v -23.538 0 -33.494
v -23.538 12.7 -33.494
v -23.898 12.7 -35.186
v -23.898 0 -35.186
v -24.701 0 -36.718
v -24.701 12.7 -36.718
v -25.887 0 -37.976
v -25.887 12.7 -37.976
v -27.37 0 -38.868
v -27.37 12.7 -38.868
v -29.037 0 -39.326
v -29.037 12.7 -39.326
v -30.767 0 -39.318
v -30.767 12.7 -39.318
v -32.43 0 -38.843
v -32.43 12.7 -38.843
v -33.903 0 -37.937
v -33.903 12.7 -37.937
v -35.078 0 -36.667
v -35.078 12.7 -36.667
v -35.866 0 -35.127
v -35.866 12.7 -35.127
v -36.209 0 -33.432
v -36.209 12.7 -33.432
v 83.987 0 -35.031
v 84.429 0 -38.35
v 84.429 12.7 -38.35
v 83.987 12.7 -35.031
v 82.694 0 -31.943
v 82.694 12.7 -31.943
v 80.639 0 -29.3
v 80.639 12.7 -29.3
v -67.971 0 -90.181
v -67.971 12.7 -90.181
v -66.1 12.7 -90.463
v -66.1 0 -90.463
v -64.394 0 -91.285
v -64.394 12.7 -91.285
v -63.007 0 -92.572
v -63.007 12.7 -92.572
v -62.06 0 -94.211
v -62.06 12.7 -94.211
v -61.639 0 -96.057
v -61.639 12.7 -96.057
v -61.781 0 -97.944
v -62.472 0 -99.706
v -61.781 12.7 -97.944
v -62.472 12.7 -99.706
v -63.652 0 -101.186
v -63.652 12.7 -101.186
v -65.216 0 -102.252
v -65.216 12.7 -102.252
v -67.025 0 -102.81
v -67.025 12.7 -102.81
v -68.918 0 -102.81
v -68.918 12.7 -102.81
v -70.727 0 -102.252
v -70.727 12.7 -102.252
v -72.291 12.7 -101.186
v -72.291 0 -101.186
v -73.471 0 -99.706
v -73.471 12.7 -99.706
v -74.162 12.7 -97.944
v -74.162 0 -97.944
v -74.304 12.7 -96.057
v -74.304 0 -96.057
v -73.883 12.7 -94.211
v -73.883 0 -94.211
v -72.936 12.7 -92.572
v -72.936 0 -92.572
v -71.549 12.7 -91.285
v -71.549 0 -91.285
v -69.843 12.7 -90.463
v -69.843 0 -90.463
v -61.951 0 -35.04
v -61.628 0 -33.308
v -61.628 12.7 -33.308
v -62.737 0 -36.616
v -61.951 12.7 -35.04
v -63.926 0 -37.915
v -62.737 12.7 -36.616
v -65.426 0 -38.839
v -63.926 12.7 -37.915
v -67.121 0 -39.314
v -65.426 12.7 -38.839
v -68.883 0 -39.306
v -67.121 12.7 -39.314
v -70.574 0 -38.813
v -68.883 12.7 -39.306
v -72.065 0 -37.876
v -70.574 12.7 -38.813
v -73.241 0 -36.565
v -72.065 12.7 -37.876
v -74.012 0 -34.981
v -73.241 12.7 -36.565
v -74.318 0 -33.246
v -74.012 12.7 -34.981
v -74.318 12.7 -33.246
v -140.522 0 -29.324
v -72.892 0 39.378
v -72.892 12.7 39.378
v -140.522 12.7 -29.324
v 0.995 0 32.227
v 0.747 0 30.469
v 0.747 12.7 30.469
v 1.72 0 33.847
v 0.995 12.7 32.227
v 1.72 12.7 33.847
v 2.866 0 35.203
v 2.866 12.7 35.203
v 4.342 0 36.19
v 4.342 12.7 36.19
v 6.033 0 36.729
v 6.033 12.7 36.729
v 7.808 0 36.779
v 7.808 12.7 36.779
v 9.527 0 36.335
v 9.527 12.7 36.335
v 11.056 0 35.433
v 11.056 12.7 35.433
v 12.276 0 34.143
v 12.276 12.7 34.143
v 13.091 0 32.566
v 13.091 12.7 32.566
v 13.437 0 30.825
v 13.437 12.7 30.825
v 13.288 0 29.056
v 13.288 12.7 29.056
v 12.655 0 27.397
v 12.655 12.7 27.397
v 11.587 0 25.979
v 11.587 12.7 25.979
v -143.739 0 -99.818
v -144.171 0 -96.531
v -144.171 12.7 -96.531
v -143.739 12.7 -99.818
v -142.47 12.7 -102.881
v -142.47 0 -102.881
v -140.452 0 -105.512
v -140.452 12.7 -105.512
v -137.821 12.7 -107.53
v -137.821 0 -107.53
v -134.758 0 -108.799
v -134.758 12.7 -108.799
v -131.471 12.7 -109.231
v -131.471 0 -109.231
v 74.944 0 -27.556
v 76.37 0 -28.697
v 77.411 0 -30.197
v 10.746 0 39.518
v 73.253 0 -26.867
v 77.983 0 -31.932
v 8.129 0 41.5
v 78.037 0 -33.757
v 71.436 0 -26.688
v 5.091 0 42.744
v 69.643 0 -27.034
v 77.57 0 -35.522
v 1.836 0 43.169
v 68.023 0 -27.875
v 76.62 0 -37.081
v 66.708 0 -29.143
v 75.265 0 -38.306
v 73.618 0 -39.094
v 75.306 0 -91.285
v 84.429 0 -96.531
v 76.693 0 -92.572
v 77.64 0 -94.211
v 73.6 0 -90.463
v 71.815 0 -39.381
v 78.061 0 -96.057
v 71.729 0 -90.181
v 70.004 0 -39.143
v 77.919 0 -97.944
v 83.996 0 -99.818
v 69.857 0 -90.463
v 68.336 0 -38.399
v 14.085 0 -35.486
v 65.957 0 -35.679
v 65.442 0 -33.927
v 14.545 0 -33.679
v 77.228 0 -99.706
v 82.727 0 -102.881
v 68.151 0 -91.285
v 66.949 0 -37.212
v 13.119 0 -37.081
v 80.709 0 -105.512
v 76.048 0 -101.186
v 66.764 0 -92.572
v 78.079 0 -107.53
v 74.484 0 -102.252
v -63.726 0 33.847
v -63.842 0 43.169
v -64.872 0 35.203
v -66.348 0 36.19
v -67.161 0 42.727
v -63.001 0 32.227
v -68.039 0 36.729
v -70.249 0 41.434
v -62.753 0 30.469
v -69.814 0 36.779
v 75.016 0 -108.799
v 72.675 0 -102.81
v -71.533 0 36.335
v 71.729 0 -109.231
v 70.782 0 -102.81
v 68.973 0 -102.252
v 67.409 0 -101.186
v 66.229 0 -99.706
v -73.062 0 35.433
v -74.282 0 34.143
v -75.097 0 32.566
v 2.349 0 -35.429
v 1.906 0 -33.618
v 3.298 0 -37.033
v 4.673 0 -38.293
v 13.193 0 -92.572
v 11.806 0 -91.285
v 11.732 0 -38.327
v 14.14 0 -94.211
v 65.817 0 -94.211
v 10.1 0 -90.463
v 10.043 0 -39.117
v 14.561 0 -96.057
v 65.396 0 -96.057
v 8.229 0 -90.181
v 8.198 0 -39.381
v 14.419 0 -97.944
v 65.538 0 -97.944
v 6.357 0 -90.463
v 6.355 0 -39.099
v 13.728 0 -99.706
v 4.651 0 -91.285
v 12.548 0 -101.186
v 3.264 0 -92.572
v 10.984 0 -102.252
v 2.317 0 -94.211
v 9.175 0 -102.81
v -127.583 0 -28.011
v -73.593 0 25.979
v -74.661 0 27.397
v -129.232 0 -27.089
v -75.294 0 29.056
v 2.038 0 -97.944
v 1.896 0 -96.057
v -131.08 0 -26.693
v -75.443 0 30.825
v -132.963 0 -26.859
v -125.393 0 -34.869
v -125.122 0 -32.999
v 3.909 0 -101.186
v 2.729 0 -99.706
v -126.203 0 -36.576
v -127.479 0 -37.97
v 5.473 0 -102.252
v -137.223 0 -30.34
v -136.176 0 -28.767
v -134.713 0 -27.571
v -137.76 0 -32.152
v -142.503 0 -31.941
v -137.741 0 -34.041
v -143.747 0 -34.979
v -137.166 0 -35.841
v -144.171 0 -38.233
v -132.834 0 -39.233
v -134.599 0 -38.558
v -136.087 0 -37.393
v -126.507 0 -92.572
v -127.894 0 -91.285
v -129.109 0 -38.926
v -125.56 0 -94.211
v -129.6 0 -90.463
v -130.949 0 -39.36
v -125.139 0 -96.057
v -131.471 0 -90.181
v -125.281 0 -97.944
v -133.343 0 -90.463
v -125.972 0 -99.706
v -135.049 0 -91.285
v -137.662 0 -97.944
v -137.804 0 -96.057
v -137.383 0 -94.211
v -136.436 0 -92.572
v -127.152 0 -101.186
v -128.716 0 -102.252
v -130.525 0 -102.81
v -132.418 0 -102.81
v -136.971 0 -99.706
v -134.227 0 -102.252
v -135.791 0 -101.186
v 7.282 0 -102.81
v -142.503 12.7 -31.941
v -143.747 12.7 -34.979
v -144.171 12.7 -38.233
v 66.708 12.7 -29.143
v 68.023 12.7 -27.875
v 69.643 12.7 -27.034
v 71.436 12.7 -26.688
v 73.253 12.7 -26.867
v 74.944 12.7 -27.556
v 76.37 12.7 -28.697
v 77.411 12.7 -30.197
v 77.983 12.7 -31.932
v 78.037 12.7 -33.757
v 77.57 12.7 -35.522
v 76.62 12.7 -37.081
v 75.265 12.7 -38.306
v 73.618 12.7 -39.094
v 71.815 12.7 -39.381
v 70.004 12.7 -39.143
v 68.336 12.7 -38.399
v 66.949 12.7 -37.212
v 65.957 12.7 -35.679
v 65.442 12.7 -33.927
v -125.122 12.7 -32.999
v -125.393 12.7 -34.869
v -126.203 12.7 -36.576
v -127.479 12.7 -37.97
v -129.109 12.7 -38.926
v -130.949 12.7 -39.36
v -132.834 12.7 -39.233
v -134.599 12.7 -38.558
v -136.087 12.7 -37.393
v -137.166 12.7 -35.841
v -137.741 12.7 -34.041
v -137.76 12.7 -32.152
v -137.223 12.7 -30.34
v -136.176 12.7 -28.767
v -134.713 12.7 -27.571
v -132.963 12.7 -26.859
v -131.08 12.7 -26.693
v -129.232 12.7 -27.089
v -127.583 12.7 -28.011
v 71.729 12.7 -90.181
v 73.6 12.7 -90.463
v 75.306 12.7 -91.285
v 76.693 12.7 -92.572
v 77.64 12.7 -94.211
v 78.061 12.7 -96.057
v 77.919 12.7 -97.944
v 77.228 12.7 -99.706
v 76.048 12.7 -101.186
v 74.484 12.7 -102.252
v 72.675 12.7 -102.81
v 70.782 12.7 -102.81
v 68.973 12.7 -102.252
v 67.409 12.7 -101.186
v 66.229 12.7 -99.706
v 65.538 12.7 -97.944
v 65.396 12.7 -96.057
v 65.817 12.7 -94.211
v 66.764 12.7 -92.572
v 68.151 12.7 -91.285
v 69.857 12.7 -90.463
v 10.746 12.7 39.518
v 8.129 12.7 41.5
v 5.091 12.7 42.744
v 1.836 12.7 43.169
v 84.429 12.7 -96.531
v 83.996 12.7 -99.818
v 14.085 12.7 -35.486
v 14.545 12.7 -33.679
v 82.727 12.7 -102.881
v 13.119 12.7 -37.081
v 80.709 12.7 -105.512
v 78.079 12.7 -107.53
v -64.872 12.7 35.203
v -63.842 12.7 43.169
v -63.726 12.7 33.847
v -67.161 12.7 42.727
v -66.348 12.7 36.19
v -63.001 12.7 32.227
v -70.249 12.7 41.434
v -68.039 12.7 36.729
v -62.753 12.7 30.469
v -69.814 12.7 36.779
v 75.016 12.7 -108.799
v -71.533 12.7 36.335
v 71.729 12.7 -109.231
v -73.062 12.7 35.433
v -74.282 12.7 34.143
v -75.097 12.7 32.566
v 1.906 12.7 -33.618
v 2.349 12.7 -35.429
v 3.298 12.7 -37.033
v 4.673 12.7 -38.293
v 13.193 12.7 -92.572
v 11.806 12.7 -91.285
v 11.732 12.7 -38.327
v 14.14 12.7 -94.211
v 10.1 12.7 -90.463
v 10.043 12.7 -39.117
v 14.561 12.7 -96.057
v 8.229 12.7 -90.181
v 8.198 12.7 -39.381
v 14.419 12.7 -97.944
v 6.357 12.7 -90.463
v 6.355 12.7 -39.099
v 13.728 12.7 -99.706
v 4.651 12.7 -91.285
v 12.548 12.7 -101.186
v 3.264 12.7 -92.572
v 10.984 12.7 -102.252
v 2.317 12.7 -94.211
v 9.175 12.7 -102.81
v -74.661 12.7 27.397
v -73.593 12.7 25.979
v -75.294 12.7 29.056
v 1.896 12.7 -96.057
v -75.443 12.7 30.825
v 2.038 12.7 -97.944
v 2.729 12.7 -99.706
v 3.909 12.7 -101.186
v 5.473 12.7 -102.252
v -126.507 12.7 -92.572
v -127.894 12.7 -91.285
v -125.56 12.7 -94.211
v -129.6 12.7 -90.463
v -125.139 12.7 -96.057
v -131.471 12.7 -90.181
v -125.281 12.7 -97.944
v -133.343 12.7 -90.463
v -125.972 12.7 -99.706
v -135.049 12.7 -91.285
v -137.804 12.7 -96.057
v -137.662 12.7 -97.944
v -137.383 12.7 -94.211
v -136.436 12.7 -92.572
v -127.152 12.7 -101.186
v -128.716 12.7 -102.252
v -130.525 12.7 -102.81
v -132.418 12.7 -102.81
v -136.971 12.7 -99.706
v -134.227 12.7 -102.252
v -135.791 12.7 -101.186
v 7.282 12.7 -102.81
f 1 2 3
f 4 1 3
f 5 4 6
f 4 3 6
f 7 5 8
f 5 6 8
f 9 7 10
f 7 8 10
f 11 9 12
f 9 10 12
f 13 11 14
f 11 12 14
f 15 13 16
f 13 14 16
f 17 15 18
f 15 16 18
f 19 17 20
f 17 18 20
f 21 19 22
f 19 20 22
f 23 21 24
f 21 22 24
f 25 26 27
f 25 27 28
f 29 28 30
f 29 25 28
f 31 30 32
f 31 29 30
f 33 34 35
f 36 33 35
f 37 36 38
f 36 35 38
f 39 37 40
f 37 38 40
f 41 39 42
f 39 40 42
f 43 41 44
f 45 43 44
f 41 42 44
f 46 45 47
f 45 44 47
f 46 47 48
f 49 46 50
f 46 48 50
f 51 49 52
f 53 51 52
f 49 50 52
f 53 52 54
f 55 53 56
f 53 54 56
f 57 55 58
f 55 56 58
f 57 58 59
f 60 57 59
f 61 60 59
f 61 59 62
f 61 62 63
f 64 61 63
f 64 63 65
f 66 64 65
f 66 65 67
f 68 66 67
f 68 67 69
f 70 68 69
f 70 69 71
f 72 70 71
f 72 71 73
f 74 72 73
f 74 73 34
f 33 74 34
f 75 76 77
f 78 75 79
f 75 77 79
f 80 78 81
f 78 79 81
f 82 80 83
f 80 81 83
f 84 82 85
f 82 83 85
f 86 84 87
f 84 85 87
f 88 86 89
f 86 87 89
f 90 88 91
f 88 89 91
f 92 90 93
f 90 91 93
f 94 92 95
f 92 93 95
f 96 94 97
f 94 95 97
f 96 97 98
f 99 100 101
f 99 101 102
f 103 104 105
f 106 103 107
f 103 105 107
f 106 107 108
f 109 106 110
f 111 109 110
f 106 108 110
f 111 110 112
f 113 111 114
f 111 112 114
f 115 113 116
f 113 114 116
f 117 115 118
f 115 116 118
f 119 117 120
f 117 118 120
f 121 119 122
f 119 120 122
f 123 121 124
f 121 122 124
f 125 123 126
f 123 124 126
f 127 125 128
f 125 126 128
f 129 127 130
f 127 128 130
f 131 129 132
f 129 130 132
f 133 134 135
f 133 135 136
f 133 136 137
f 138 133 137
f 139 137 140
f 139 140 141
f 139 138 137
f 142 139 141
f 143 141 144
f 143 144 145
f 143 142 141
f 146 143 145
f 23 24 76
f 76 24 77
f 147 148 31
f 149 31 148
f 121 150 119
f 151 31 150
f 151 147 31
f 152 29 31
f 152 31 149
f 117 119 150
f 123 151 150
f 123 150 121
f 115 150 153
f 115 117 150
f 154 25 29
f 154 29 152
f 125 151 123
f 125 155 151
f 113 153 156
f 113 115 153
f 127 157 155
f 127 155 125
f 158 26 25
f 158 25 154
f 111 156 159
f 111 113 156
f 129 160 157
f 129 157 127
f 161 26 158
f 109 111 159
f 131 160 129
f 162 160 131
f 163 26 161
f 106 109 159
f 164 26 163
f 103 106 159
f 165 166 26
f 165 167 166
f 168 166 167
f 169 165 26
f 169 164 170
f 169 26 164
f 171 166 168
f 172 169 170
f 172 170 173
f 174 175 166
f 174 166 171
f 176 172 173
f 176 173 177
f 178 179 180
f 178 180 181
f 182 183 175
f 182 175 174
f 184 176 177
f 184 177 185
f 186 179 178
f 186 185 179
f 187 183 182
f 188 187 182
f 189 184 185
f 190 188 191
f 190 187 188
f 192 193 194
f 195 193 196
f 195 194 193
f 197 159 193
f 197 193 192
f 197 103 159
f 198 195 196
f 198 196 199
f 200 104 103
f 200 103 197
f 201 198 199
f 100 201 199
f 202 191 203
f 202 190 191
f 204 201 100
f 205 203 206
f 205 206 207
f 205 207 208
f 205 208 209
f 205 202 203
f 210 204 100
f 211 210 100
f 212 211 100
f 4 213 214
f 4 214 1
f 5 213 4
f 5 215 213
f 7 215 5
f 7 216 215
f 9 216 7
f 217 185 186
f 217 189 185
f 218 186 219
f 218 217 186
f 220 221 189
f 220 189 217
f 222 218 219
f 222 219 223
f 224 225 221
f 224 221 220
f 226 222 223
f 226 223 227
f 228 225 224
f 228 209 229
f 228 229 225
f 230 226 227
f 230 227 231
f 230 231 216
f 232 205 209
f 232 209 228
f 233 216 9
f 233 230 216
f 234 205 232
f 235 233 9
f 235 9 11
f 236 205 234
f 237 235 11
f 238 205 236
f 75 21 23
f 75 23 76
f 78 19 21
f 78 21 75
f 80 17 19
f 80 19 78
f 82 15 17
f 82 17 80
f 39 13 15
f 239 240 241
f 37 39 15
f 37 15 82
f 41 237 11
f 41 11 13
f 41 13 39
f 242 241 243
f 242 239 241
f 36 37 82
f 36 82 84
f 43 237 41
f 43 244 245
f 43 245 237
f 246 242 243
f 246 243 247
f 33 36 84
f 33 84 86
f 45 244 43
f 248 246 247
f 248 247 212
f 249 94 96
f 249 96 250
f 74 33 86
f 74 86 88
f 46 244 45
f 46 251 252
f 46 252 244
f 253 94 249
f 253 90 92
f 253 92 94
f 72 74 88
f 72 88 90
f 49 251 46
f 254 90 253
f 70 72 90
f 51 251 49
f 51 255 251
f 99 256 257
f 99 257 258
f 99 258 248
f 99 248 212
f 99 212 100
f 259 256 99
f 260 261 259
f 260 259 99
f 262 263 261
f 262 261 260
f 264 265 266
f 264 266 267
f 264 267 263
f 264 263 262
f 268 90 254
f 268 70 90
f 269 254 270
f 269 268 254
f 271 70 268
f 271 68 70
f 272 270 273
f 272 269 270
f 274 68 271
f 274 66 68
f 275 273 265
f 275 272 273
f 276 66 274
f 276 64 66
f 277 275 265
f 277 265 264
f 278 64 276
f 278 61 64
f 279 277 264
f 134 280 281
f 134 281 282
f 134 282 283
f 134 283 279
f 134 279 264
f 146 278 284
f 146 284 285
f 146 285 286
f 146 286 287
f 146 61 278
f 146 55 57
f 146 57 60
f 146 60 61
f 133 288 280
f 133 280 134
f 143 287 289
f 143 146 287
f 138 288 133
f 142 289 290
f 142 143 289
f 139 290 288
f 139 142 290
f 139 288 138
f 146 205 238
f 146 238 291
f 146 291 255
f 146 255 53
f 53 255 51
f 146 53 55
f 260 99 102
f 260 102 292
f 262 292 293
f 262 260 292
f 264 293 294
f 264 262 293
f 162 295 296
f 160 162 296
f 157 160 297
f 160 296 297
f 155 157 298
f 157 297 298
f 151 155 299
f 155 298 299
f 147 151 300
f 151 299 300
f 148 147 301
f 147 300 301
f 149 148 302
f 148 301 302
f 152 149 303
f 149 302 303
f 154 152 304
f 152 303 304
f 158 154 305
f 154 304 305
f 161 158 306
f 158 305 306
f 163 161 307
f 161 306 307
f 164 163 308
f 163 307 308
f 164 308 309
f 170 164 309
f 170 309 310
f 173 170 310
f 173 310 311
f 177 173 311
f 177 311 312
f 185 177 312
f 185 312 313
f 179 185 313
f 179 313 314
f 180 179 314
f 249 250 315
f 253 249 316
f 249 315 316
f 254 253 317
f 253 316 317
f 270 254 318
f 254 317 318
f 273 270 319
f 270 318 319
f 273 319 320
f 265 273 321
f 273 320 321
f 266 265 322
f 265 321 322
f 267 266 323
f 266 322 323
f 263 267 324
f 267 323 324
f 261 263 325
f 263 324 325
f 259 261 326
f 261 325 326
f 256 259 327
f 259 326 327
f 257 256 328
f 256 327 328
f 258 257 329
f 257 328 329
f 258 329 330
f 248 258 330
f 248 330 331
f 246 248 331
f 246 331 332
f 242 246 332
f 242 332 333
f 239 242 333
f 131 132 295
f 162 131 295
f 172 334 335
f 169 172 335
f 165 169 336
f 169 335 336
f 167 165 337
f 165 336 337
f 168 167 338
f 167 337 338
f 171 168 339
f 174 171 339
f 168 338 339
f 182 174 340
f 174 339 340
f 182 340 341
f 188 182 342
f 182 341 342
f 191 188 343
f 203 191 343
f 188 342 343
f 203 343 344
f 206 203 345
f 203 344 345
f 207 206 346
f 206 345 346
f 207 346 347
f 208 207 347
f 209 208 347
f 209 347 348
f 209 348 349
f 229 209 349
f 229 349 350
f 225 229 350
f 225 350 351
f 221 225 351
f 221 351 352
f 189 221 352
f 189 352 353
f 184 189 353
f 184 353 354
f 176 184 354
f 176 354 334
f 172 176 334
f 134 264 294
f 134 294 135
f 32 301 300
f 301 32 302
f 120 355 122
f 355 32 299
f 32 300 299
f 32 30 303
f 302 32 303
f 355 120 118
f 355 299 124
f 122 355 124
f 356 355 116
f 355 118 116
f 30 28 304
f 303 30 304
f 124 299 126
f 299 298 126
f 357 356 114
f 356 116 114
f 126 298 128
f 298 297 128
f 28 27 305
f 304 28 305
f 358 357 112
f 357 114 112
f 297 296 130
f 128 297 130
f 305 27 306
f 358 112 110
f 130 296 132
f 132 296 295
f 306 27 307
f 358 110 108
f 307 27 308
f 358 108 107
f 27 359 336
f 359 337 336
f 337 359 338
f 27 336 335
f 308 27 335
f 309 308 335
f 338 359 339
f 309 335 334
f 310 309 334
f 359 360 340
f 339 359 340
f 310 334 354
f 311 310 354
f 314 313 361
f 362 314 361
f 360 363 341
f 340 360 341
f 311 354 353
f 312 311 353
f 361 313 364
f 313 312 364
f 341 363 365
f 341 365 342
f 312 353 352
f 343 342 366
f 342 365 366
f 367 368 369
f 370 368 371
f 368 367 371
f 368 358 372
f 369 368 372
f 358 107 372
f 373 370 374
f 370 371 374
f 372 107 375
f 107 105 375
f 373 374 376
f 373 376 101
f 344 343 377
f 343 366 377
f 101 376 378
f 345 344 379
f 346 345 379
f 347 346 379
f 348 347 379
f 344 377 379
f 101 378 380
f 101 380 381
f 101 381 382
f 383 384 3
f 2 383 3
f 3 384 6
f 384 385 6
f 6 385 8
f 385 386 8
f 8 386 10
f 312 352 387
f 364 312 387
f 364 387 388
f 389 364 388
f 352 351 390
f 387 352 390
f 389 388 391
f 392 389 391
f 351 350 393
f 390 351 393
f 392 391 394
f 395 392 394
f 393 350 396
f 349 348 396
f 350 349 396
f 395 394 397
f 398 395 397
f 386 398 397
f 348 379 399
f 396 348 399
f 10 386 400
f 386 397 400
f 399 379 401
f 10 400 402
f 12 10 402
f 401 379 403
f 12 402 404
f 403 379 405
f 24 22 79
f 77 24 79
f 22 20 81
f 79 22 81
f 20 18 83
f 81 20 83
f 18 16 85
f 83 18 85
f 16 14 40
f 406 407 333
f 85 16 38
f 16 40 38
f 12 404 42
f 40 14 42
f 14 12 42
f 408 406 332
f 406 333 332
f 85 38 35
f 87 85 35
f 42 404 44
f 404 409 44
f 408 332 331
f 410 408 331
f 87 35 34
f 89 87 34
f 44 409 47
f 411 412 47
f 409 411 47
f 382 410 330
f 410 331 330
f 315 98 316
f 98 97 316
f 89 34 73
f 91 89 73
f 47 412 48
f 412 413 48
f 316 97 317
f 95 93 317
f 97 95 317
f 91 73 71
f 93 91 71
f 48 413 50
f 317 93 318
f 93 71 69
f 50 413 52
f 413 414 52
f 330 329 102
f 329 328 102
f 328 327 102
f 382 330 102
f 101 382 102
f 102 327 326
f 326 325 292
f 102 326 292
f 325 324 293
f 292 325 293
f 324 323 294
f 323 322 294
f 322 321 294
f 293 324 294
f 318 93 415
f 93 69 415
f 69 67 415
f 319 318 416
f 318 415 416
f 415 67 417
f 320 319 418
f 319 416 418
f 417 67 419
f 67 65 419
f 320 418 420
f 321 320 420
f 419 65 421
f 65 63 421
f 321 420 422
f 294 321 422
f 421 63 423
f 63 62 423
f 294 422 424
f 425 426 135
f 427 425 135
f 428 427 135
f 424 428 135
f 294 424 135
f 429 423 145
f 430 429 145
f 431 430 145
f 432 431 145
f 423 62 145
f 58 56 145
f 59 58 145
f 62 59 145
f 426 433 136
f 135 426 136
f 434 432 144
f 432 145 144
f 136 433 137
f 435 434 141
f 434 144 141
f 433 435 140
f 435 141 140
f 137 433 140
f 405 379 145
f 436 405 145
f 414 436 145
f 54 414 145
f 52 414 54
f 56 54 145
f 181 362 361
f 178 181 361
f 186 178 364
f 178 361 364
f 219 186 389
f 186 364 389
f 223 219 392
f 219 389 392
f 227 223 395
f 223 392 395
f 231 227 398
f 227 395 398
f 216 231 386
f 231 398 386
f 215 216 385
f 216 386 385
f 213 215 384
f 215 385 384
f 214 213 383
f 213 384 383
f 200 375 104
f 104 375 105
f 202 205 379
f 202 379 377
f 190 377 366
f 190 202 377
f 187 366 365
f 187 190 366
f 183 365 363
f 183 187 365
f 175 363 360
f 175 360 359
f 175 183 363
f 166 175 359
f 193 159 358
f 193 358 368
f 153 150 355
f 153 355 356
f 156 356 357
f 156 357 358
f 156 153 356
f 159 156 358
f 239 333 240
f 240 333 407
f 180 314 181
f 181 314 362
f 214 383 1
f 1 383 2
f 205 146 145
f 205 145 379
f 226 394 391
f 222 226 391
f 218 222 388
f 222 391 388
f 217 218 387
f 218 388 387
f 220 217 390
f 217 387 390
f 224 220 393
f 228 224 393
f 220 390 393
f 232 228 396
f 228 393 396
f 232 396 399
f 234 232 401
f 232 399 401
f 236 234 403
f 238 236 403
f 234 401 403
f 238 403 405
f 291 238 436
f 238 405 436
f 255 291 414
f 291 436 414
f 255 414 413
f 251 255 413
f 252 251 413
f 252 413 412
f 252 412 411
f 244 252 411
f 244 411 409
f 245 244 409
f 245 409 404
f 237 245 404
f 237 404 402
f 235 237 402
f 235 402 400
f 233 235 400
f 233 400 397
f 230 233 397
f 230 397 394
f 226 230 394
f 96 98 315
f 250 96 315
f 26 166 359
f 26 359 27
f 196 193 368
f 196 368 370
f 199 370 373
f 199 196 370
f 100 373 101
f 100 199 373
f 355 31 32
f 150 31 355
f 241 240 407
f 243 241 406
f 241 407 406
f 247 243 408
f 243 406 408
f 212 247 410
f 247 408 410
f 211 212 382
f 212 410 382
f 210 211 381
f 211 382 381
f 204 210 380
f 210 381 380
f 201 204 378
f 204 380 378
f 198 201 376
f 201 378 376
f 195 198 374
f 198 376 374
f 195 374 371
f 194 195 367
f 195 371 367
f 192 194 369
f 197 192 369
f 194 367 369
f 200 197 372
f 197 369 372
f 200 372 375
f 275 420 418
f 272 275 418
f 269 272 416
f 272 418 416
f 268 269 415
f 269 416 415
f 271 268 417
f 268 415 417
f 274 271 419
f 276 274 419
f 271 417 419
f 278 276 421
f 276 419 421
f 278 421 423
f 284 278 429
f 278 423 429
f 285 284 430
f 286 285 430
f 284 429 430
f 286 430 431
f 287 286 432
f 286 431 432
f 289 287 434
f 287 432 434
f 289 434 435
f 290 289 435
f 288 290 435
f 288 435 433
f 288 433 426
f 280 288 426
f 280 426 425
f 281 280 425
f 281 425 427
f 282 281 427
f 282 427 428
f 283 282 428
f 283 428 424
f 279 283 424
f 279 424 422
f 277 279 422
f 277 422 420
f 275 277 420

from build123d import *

# Parameters (mm, degrees)
BOSS_EXTRUDE1_DEPTH = 12.7
SKETCH2_R           = 6.35
CUT_EXTRUDE1_DEPTH  = 182.323455578
CUT_EXTRUDE10_DEPTH = 182.323455578


with BuildPart() as part:
    # Sketch1 → Boss-Extrude1 (new body)
    with BuildSketch(Plane(origin=(0, 0, 0), x_dir=(1, 0, 0), z_dir=(0, 1, 0))):
        with BuildLine():
            Line((-131.471489953, 109.23134636), (71.728510047, 109.23134636))
            ThreePointArc((71.728510047, 109.23134636), (80.708766168, 105.511602481), (84.428510047, 96.53134636))
            Line((84.428510047, 96.53134636), (84.428510047, 38.349564826))
            ThreePointArc((84.428510047, 38.349564826), (83.442873319, 33.444088994), (80.638952072, 29.300033185))
            Line((80.638952072, 29.300033185), (10.746499625, -39.518185281))
            ThreePointArc((10.746499625, -39.518185281), (6.650668081, -42.220654573), (1.836057601, -43.16865364))
            Line((1.836057601, -43.16865364), (-63.841823784, -43.16865364))
            ThreePointArc((-63.841823784, -43.16865364), (-68.748013198, -42.182718068), (-72.892440933, -39.377993078))
            Line((-72.892440933, -39.377993078), (-140.522107103, 29.324094297))
            ThreePointArc((-140.522107103, 29.324094297), (-143.22378415, 33.419539146), (-144.171489953, 38.233433734))
            Line((-144.171489953, 38.233433734), (-144.171489953, 96.53134636))
            ThreePointArc((-144.171489953, 96.53134636), (-140.451746074, 105.511602481), (-131.471489953, 109.23134636))
        make_face()
    extrude(amount=BOSS_EXTRUDE1_DEPTH)

    # Sketch2 → Cut-Extrude1 (cut, through all)
    with BuildSketch(Plane(origin=(0, 12.7, 0), x_dir=(1, 0, 0), z_dir=(0, 1, 0))):
        with Locations(Location((-69.102883091, -30.46865364, 0), (0, 0, 270))):
            Circle(SKETCH2_R)
        with Locations(Location((7.097116909, -30.46865364, 0), (0, 0, 270))):
            Circle(SKETCH2_R)
        with Locations(Location((-67.971489953, 96.53134636, 0), (0, 0, 270))):
            Circle(SKETCH2_R)
        with Locations(Location((8.228510047, 96.53134636, 0), (0, 0, 270))):
            Circle(SKETCH2_R)
        with Locations(Location((-67.971489286, 33.021266411, 0), (0, 0, 270))):
            Circle(SKETCH2_R)
        with Locations(Location((8.228510047, 33.03134636, 0), (0, 0, 270))):
            Circle(SKETCH2_R)
        with Locations(Location((-131.471489953, 96.53134636, 0), (0, 0, 270))):
            Circle(SKETCH2_R)
        with Locations(Location((-131.471489953, 33.03134636, 0), (0, 0, 270))):
            Circle(SKETCH2_R)
        with Locations(Location((71.728510047, 96.53134636, 0), (0, 0, 270))):
            Circle(SKETCH2_R)
        with Locations(Location((71.728510047, 33.03134636, 0), (0, 0, 270))):
            Circle(SKETCH2_R)
        with Locations(Location((-29.871490619, 33.03134636, 0), (0, 0, 270))):
            Circle(SKETCH2_R)
    extrude(amount=-CUT_EXTRUDE1_DEPTH, mode=Mode.SUBTRACT)

    # Sketch3 → Cut-Extrude10 (cut, through all)
    with BuildSketch(Plane(origin=(0, 12.7, 0), x_dir=(1, 0, 0), z_dir=(0, 1, 0))):
        Polygon((-132.534139195, 32.962602464), (-69.102883091, -30.46865364), (7.097116909, -30.46865364), (71.522699324, 33.956928775), align=None)
    extrude(amount=-CUT_EXTRUDE10_DEPTH, mode=Mode.SUBTRACT)


solid = part.part
